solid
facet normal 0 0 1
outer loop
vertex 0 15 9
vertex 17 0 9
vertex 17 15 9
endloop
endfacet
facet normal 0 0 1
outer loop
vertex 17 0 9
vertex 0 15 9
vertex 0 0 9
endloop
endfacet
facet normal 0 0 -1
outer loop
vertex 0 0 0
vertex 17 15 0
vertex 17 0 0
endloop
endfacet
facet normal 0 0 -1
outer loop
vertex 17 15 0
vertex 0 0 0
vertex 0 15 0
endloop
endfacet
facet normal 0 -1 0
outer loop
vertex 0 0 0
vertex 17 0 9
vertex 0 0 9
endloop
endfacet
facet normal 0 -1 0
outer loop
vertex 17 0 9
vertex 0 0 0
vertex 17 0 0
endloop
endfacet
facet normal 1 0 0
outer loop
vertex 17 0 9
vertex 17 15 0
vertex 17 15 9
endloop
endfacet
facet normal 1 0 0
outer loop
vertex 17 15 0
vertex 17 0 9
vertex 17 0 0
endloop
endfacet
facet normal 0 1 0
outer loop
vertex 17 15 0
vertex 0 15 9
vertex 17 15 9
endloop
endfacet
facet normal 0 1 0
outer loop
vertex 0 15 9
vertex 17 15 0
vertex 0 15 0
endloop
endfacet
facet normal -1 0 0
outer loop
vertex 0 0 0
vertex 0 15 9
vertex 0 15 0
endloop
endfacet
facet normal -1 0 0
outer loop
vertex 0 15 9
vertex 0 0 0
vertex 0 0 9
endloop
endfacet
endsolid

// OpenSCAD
// Generated by SolidPython 1.0.1 on 2020-07-29 00:46:56


cube(size = [17, 15, 9]);
/***********************************************
*********      SolidPython code:      **********
************************************************
 
# import packages: SolidPython
from solid import *
from solid.utils import *
from itertools import chain, combinations, permutations


class Resize:

    def __init__(self, scad_file):
        self.scad_file = scad_file
        #self.scad_file = import_scad(scad_file)
        # cone/cylinder param:
        self.r1 = 0
        self.r2 = 0
        self.h = 0
        # rectangular prism param:
        self.w = 0
        self.l = 0
        # ellipse param:
        self.r = 0

    # import OpenScad code (file name corresponds to shape)


    # classify shape + parameters
    def assign(self, param1, param2, param3):
        if self.scad_file == 'cone.scad':
            self.r1 = param1
            self.r2 = param2
            self.h = param3
        elif self.scad_file == 'cylinder.scad':
            self.r1 = param1
            self.r2 = param2
            self.h = param3
        elif self.scad_file == 'rectangularPrism.scad':
            self.h = param1
            self.l = param2
            self.w = param3
        else:
            self.r = param1
            self.h = param2

    # resize parameters
    def iterate(self):
        x = range(3, 20, 2)
        i = 1
        if self.scad_file == 'cone.scad':
            tempList = list(permutations(x, 2))
            for temp in tempList:
                param1 = temp[0]
                param2 = temp[1]
                filepath = 'produced_scad_files/' + 'cone' + str(param1) + '_' + str(param2) + '_' + '.scad'
                scad_render_to_file(cylinder(h=param1, r1=param2, r2=0), filepath)

        elif self.scad_file == 'cylinder.scad':
            tempList = list(permutations(x, 3))
            for temp in tempList:
                param1 = temp[0]
                param2 = temp[1]
                filepath = 'produced_scad_files/' + 'cylinder' + str(param1) + '_' + str(param2) + '_' + '.scad'
                scad_render_to_file(cylinder(h=param1, r1=param2, r2=param2), filepath)

        elif self.scad_file == 'rectangularPrism.scad':
            tempList = list(permutations(x, 3))
            for temp in tempList:
                param1 = temp[0]
                param2 = temp[1]
                param3 = temp[2]
                filepath = 'produced_scad_files/' + 'rectangularPrism' + str(param1) + '_' + str(param2) + '_' + str(
                    param3) + '.scad'
                scad_render_to_file(cube(size=(param1, param2, param3)), filepath)

        elif self.scad_file == 'ellipse.scad':
            tempList = list(permutations(x, 4))
            for temp in tempList:
                param1 = temp[0]
                param2 = temp[1]
                param3 = temp[2]
                param4 = temp[3]
                filepath = 'produced_scad_files/' + 'ellipse' + str(param1) + '_' + str(param2) + '_' + str(param3) + '_' + str(param4) + '.scad'
                scad_render_to_file(scale([param1, param2, param3])(sphere(r=param4)), filepath)

    def render_to_scadfile(self):
        scad_render_to_file(scad, 'example.scad') 
 
************************************************/
